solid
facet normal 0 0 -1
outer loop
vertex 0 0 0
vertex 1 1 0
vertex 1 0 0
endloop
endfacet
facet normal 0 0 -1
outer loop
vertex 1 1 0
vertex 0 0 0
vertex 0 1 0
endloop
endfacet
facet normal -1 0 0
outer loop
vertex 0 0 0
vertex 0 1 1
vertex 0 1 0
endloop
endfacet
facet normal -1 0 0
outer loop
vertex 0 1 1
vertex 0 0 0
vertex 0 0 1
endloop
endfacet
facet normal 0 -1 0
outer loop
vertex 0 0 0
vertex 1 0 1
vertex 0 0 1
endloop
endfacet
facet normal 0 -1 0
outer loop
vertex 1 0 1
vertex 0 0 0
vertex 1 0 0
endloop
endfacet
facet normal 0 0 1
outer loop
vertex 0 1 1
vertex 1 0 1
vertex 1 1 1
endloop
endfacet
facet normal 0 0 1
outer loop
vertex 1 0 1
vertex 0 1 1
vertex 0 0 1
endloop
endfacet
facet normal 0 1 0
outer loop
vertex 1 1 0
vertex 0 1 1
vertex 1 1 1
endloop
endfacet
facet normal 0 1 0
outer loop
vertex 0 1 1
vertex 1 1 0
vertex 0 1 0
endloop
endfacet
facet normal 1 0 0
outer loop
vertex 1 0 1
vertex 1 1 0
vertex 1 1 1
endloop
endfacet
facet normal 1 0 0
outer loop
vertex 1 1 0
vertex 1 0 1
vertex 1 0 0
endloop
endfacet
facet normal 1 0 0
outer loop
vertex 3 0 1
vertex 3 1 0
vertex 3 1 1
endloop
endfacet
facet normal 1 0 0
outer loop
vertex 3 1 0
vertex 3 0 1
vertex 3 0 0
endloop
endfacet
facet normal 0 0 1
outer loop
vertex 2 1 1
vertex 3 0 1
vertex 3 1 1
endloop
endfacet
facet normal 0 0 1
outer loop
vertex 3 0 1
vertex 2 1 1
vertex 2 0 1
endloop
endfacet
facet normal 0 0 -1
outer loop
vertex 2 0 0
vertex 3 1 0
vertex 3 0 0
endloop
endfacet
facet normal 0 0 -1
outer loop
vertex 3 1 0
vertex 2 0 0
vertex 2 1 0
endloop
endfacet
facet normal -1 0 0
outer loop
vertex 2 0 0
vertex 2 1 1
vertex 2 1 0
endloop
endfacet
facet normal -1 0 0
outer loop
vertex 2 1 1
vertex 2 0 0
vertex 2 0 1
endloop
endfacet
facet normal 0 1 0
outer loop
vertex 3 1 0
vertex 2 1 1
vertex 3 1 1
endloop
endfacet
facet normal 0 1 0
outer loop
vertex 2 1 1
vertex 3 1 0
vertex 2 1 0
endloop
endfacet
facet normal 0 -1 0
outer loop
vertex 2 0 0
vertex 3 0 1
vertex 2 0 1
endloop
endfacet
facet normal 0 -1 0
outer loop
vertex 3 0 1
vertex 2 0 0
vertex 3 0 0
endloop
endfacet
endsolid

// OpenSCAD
// A polyhedron closed only by position (repeated points), as BOSL2 makes them:
// OpenSCAD merges the points silently.
pts = [[0,0,0],[1,0,0],[1,1,0],[0,1,0],[0,0,1],[1,0,1],[1,1,1],[0,1,1], [0,0,1],[1,0,1],[1,1,1],[0,1,1]];
faces = [[0,1,2,3],[11,10,9,8] /*top uses dups*/,[0,4,5,1],[1,5,6,2],[2,6,7,3],[3,7,4,0]];
union() { polyhedron(pts, faces); translate([2,0,0]) cube(); }
